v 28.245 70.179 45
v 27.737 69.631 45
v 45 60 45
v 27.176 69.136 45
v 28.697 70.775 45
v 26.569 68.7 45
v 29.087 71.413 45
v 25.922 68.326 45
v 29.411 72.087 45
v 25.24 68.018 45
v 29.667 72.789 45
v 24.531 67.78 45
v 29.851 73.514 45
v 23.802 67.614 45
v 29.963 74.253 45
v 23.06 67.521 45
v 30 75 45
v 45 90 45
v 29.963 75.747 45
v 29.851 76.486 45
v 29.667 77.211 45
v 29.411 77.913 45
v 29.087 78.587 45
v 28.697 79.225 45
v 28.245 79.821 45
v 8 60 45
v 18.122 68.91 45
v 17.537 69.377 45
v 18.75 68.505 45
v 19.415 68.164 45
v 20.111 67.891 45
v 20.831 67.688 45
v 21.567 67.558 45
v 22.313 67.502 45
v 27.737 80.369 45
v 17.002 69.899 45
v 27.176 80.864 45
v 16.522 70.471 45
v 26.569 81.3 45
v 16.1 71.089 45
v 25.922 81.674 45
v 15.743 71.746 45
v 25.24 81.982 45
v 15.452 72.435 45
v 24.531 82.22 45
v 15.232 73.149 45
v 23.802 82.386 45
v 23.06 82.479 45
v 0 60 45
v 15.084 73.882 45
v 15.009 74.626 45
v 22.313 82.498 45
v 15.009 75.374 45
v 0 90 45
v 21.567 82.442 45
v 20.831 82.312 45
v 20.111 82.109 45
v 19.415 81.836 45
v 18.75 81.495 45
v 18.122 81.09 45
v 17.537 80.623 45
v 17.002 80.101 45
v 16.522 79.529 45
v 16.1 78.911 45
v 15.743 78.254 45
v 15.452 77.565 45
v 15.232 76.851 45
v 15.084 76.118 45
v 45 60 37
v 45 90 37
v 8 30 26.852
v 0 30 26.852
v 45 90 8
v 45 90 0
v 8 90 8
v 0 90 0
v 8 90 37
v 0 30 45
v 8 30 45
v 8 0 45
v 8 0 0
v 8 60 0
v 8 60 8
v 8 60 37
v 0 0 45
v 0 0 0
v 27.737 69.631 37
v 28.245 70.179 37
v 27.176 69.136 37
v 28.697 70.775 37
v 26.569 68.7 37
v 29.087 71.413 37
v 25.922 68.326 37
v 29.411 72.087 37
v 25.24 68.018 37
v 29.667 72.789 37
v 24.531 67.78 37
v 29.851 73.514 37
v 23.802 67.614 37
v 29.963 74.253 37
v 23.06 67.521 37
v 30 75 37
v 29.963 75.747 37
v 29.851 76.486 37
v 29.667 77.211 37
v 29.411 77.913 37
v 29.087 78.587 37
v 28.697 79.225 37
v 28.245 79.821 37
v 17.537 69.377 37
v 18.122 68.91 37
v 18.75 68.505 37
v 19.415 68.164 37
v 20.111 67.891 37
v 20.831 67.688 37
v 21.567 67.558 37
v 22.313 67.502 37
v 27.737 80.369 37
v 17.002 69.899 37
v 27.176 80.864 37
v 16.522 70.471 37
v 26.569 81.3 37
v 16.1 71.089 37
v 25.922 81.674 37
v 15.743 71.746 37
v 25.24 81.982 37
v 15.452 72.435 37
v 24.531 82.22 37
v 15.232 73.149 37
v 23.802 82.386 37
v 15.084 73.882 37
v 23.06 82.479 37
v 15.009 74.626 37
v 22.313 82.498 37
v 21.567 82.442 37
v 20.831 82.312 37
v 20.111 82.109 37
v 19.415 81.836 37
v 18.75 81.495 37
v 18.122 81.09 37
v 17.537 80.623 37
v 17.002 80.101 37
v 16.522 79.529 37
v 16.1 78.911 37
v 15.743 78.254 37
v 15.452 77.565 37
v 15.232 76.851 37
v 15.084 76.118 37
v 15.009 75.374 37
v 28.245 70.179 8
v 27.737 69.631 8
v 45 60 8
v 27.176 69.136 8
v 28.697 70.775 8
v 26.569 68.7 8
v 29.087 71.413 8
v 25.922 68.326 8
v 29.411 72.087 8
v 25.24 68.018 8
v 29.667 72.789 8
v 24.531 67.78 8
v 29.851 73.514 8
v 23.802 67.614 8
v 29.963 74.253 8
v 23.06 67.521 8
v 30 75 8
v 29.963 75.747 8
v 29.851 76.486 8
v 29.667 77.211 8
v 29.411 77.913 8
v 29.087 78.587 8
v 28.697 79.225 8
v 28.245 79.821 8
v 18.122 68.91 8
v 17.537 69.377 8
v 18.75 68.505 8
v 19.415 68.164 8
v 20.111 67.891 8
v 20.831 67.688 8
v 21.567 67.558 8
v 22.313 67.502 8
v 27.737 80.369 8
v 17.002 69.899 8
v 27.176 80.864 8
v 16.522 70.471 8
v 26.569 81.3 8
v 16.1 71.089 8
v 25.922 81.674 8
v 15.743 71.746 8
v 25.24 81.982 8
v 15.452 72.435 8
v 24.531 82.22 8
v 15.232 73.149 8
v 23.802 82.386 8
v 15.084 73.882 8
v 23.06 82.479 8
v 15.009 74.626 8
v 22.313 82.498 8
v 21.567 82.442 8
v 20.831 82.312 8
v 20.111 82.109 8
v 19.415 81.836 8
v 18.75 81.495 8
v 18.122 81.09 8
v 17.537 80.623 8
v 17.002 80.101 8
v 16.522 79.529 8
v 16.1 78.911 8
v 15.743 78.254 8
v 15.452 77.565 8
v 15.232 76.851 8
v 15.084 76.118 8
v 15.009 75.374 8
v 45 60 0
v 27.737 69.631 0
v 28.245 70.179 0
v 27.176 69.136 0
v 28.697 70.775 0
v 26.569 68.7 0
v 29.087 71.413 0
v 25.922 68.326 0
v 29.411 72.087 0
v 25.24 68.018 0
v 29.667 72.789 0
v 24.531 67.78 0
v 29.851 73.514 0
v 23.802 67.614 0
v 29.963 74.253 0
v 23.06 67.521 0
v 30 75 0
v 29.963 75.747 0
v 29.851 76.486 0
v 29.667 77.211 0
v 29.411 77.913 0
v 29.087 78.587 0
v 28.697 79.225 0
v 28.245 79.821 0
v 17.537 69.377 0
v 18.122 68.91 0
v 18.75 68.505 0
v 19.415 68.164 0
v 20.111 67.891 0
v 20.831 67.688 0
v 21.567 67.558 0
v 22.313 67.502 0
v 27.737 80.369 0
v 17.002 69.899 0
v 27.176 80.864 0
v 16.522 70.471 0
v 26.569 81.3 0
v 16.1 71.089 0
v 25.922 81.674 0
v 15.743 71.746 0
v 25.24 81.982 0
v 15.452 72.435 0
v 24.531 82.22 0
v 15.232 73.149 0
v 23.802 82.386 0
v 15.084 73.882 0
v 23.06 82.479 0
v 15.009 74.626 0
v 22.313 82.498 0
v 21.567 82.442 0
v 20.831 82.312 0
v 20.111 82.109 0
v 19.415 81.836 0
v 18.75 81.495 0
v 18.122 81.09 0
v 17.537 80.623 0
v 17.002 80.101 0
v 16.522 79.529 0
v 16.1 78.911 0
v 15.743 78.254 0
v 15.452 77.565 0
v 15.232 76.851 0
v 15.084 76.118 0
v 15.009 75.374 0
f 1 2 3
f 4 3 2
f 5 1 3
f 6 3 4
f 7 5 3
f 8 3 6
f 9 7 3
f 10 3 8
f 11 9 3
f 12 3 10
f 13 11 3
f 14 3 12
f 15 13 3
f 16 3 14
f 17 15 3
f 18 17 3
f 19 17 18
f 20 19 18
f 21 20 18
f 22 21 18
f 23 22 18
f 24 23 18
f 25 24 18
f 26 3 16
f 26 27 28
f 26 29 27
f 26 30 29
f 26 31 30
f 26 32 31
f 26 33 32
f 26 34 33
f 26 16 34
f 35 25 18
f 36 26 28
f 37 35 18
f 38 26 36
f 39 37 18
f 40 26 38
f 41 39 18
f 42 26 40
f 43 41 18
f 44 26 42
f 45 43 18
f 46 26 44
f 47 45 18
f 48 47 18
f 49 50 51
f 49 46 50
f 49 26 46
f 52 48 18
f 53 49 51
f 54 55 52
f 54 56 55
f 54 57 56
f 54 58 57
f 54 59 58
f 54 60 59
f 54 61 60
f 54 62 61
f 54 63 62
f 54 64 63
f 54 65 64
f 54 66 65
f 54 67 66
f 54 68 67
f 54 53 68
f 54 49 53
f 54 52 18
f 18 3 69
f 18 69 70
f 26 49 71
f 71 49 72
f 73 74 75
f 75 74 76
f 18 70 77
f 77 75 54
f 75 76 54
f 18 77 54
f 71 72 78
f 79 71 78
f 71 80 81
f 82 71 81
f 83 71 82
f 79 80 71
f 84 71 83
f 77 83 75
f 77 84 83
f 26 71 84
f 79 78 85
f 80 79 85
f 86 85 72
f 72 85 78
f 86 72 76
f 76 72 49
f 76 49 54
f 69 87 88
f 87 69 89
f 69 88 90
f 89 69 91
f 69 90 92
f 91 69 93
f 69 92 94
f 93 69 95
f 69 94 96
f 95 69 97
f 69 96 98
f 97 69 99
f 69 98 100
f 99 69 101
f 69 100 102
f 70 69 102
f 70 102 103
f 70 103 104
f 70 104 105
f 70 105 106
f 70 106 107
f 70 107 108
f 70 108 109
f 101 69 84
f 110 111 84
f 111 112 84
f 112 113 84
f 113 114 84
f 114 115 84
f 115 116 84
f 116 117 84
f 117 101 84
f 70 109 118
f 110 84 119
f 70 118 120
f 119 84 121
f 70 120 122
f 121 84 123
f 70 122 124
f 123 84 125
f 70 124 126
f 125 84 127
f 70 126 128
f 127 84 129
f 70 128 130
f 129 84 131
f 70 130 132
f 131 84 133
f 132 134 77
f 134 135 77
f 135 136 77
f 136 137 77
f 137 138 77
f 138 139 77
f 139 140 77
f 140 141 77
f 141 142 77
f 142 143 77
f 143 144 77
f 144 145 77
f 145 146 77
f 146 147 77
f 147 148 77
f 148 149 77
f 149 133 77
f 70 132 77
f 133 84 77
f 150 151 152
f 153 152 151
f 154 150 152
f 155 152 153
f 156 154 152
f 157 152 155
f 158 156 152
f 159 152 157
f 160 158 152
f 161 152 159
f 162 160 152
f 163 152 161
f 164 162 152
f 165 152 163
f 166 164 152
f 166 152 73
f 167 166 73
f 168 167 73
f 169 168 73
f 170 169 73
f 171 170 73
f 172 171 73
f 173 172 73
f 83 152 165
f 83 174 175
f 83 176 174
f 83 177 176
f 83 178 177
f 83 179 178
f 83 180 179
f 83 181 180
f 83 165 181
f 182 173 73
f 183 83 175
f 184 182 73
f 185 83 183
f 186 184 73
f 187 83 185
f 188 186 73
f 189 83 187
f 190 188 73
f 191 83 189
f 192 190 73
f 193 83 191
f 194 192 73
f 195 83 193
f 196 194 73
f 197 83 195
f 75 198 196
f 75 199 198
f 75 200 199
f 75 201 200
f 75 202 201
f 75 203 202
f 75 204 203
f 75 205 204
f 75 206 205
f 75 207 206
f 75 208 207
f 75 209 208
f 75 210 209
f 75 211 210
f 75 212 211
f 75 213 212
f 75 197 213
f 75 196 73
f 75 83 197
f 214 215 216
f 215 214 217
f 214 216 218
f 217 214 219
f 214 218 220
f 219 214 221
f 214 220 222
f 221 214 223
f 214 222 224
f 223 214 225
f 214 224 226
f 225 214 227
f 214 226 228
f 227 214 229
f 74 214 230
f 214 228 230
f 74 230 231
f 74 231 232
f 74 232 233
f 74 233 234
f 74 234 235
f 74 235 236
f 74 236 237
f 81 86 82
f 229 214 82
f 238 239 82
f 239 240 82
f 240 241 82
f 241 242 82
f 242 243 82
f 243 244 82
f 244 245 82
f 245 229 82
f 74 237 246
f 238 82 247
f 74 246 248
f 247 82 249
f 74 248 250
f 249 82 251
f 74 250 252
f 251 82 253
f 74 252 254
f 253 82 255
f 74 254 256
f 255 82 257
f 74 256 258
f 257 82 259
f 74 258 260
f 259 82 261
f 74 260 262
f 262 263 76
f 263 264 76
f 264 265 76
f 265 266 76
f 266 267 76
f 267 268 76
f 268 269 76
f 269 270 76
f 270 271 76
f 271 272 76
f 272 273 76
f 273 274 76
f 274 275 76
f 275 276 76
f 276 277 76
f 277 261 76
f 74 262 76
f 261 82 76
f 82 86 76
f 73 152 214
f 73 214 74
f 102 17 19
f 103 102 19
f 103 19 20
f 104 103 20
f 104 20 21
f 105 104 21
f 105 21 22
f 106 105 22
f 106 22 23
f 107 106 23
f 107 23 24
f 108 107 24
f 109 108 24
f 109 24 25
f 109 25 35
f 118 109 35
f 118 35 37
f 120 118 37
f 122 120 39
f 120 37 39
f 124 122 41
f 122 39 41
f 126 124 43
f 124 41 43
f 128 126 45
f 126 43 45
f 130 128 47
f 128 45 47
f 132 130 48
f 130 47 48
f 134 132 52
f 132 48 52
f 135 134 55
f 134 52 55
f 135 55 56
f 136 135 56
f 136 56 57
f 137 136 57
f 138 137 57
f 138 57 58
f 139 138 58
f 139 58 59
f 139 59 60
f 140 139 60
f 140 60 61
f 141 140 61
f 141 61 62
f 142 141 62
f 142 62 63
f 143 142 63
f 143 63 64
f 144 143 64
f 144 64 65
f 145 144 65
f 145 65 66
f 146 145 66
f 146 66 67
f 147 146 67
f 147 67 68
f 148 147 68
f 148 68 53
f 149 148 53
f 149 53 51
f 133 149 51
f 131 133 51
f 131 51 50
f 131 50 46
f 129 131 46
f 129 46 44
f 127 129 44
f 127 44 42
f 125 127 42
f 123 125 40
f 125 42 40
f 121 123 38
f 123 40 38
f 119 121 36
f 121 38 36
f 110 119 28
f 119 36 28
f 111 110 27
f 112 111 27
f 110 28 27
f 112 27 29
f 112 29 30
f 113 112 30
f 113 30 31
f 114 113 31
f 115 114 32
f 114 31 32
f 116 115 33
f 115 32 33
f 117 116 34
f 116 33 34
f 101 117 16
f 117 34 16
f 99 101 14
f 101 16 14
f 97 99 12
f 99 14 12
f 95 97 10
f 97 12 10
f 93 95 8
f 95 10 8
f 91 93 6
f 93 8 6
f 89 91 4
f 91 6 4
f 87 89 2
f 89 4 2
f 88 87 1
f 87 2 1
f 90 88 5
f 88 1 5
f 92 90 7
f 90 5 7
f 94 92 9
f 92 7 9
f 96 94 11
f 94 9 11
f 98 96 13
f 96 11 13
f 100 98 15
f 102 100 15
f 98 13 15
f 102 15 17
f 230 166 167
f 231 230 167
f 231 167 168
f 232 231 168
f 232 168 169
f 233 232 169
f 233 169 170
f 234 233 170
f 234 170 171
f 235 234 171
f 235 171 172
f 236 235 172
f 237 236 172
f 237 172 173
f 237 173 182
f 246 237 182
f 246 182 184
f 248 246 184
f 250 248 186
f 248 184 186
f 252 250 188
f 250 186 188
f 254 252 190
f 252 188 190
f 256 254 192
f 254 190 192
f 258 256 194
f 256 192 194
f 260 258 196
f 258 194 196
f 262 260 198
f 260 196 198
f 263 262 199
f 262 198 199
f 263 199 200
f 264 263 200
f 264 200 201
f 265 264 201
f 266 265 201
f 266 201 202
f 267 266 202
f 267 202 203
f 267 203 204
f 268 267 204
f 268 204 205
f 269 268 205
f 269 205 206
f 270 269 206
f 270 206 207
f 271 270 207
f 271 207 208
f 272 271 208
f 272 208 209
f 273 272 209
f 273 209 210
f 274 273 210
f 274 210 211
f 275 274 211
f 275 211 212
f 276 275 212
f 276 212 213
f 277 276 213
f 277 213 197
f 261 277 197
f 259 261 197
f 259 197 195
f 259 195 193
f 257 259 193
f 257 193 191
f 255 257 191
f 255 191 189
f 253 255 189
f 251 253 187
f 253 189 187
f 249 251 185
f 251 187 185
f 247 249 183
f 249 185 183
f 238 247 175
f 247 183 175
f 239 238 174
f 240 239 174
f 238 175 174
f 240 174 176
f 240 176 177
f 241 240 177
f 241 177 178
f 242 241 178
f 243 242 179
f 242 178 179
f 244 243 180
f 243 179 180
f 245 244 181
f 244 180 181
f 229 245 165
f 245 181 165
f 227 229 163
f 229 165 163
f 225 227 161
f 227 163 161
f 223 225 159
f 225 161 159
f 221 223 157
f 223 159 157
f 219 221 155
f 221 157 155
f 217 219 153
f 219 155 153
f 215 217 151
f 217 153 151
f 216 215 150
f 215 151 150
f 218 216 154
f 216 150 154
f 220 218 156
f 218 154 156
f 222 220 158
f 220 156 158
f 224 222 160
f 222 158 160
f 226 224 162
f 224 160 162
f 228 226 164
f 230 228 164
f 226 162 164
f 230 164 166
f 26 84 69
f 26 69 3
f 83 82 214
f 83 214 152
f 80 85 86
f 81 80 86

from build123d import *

# Parameters (mm, degrees)
F1_DEPTH = 8
F2_W     = 30
F2_H     = 8
F3_DEPTH = 37
F4_R     = 7.5
F5_DEPTH = 45.001


with BuildPart() as f1:
    # F0 (on Right) → F1 (new body)
    with BuildSketch(Plane.YZ):
        Polygon((0, 45), (0, 0), (90, 0), (90, 45), (60, 45), (30, 26.851851), (30, 45), align=None)
    extrude(amount=F1_DEPTH)

    # F2 (on face) → F3 (join)
    with BuildSketch(Plane.YZ.offset(8)):
        with Locations((75, 41)):
            Rectangle(F2_W, F2_H)
        with Locations((75, 4)):
            Rectangle(F2_W, F2_H)
    extrude(amount=F3_DEPTH)

    # F4 (on face) → F5 (cut, through all)
    with BuildSketch(Plane.XY.offset(45)):
        with Locations((22.5, 75)):
            Circle(F4_R)
    extrude(amount=-F5_DEPTH, mode=Mode.SUBTRACT)


solid = f1.part
